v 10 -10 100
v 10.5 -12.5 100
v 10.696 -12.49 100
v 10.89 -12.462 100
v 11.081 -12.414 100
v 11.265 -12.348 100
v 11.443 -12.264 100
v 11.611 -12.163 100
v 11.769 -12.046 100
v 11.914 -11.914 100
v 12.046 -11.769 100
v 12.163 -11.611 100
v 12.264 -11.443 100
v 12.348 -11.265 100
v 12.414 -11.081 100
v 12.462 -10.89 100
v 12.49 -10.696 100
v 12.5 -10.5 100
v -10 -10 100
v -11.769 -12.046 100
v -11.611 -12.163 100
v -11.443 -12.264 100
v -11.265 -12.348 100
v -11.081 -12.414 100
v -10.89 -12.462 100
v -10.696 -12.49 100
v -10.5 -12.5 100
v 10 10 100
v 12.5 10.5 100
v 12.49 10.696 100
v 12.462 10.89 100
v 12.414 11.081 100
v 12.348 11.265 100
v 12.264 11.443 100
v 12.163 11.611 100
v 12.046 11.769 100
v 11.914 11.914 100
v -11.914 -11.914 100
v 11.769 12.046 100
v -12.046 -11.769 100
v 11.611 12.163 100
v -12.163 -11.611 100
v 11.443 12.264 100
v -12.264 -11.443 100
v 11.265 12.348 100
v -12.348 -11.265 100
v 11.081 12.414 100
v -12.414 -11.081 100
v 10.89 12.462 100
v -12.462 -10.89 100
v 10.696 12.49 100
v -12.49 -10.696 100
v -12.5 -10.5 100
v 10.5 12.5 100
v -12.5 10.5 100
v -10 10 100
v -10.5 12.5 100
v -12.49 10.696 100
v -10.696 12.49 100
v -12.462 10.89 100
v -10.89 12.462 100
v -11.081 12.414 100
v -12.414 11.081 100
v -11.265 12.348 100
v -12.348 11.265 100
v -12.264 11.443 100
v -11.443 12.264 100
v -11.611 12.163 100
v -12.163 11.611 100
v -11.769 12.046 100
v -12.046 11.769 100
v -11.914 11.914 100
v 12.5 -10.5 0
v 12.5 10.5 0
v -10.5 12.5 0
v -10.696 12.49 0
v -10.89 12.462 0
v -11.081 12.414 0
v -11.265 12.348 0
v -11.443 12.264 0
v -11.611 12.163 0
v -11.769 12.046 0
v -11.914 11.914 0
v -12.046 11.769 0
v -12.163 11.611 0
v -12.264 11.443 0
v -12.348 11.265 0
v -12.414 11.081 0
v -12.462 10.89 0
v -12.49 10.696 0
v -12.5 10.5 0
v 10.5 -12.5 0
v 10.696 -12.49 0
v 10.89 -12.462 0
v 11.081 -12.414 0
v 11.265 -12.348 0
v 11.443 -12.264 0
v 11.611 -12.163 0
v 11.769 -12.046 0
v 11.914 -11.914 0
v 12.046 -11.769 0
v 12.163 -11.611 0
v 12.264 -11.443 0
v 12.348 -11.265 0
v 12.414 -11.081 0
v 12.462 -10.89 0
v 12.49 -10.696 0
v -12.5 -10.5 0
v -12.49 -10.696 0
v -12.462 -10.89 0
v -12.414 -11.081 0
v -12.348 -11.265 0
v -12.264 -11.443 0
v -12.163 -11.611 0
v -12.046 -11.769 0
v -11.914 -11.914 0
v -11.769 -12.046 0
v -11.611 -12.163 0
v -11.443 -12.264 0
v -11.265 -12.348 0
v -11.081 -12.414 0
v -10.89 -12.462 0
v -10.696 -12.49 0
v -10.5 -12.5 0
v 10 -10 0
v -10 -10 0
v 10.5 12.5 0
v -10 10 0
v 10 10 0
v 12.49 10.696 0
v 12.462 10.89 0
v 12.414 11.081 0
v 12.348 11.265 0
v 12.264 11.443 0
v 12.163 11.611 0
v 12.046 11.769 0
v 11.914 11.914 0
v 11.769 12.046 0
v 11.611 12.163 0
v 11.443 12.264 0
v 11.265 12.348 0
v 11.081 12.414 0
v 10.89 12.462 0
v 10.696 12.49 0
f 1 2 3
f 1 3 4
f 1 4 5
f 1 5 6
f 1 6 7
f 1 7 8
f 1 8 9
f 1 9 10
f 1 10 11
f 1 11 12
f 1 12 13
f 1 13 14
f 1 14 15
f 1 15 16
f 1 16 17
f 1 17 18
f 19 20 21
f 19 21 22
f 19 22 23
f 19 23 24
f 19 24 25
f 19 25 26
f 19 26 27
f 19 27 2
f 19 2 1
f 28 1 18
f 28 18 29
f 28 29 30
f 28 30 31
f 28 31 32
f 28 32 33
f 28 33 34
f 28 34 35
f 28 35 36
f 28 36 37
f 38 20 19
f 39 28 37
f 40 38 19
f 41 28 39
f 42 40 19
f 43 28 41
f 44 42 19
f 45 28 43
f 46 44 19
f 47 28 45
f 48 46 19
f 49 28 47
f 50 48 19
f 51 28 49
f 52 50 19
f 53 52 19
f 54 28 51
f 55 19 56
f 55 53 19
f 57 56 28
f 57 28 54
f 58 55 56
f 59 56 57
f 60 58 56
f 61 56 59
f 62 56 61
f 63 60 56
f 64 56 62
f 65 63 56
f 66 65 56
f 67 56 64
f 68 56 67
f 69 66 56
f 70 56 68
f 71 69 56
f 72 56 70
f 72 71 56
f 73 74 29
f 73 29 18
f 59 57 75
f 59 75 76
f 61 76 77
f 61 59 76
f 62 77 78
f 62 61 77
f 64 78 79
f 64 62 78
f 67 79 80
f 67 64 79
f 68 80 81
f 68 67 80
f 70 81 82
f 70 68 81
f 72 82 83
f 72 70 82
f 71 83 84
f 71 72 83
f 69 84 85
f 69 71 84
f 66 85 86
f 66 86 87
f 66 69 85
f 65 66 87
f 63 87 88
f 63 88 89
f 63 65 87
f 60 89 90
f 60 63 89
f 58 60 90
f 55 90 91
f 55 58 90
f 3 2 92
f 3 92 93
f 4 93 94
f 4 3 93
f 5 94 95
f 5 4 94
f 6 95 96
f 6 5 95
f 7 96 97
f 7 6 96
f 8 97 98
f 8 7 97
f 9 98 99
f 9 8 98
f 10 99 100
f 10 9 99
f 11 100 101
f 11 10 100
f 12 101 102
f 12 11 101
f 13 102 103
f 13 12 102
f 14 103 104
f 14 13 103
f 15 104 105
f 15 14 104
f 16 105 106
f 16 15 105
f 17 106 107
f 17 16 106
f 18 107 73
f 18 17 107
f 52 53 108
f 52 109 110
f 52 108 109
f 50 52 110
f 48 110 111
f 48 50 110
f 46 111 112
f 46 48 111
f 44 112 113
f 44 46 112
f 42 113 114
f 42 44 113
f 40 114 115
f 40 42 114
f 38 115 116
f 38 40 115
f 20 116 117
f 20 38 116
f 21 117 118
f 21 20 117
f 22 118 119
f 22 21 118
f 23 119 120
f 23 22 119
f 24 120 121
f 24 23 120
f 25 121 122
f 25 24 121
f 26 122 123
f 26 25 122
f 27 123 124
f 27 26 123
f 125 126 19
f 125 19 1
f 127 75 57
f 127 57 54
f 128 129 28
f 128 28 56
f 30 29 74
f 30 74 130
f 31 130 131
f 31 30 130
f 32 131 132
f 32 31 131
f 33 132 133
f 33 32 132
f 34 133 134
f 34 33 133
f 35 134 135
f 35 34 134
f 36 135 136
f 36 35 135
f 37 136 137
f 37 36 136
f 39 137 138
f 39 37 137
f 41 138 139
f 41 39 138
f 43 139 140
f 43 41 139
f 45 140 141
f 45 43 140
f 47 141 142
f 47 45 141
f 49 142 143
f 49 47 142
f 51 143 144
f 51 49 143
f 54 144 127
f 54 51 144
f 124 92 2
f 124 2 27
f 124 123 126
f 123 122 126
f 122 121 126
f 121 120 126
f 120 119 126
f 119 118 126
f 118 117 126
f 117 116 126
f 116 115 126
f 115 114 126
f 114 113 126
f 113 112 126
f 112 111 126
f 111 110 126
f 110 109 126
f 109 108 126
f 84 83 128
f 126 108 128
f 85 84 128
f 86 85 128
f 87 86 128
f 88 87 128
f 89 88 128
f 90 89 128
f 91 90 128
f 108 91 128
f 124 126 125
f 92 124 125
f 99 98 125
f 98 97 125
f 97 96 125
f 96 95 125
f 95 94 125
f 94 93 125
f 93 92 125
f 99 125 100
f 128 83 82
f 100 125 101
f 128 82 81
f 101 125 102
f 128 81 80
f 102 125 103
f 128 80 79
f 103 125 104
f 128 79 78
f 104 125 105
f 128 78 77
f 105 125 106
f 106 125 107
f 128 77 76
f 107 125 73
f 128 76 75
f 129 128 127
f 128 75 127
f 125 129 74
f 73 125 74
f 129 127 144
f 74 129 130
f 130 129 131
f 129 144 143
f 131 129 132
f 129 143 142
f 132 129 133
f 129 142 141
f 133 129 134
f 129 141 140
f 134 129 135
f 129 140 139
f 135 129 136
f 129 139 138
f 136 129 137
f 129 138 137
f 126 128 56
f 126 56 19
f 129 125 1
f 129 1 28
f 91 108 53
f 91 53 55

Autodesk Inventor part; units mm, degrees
ref_plane "YZ Plane" through (0, 0, 0) normal (1, 0, 0) x (0, 1, 0)
sketch "Sketch1" plane through (0, 0, 0) normal (0, 0, 1) x (1, 0, 0)
  line L0 (-12.5, 12.5) -> (12.5, 12.5)
  line L1 (12.5, 12.5) -> (12.5, -12.5)
  line L2 (12.5, -12.5) -> (-12.5, -12.5)
  line L3 (-12.5, -12.5) -> (-12.5, 12.5)
  line L4 (10, 10) -> (-10, 10)
  line L5 (-10, 10) -> (-10, -10)
  line L6 (-10, -10) -> (10, -10)
  line L7 (10, -10) -> (10, 10)
  point P0 (0, 0)
  dimension "d0" = 25
  dimension "d1" = 25
  dimension "d2" = 12.5
  dimension "d3" = 12.5
  dimension "d4" = 2.5
extrude "Extrusion1" add sketch "Sketch1" along normal blind 1000
fillet "Fillet1" radius 2 4 edges at (12.5, 12.5, 500) (-12.5, 12.5, 500) (-12.5, -12.5, 500) (12.5, -12.5, 500)
ref_plane "Work Plane1" through (0, 0, 100) normal (0, 0, -1) x (-1, 0, 0)
split "Split1" plane through (0, 0, 100) removes the side toward (0, 0, 1)
ref_plane "axialPlane" through (0, -10.5, 0) normal (1, 0, 0) x (0, 0, -1)
equation "\"d0\" = -2 * a + sm_varx_squareBarDimension - tol"
equation "\"d1\" = d0"
equation "\"d2\" = 0.5 * d1"
equation "\"d3\" = 0.5 * d0"
equation "\"d4\" = sm_varx_squareBarThickness"
equation "\"sm_varx_squareBarThickness\" = 2.5"
equation "\"a\" = sm_varx_squareBarThickness"
equation "\"hoop_angle_z\" = 45deg"
equation "\"hoop_bearing_length\" = 5deg"
equation "\"hoop_cable_diam\" = 5"
equation "\"hoop_cable_pulley_diam\" = 22"
equation "\"hoop_thickness_large\" = 4"
equation "\"hoop_thickness_medium\" = 3.2"
equation "\"hoop_thickness_small\" = 2"
equation "\"hoop_width_large\" = 51"
equation "\"hoop_width_medium\" = 33.7"
equation "\"hoop_width_small\" = 25.4"
equation "\"rack_tooth_addendum\" = 5"
equation "\"rack_tooth_dedendum\" = 5"
equation "\"rack_tooth_thickness\" = 5"
equation "\"secure_arm_angle\" = 35deg"
equation "\"secure_arm_radii\" = 9"
equation "\"support_baseClamp_platformLengthBuffer\" = 35"
equation "\"support_baseClamp_platformThickness\" = 15"
equation "\"support_baseClamp_platformWidthBuffer\" = 0"
equation "\"support_baseClamp_sleeveHoleDiameter\" = 12"
equation "\"support_baseClamp_sleeveSweepTerminationAngle\" = 55deg"
equation "\"support_baseClamp_thickness\" = 8"
equation "\"support_frame_endHoleBuffer\" = 45"
equation "\"support_frame_squareBarFillet\" = 2"
equation "\"support_frame_squareBarThickness\" = 5"
equation "\"hoop_tabs_thickness\" = 6"
equation "\"hoop_tabs_hole\" = 12"
equation "\"wheelchair_deployed_width\" = 635"
equation "\"wheelchair_deployed_length\" = 1067"
equation "\"wheelchair_deployed_height\" = 914"
equation "\"sm_varx_pinPlate_thickness\" = 5"
equation "\"sm_varx_pinPlate_holeDiameter\" = 5"
equation "\"sm_varx_member_tolerance\" = 0"
equation "\"hoop_bushing12_radialInterference\" = 0"
equation "\"hoop_bushing23_radialInterference\" = 0"
equation "\"hoop_bushing23_od\" = -2 * hoop_thickness_medium + hoop_width_medium + hoop_bushing23_radialInterference"
equation "\"hoop_bushing23_thickness\" = -hoop_width_small + hoop_bushing23_od - 2 * hoop_bushing23_radialInterference"
equation "\"hoop_bushing12_od\" = -2 * hoop_thickness_large + hoop_width_large + hoop_bushing12_radialInterference"
equation "\"wheelchatir_pos_deploy_angle_0\" = 65deg"
equation "\"wheelchatir_pos_store_angle_0\" = 90deg"
equation "\"wheelchatir_pos_deploy_angle_1\" = 20deg"
equation "\"wheelchatir_pos_store_angle_1\" = 20deg"
equation "\"hoop_bushing12_thickness\" = -hoop_width_medium + hoop_bushing12_od - 2 * hoop_bushing12_radialInterference"
equation "\"sm_varx_squareBarDimension\" = 30"
equation "\"tol\" = 0"
properties part number "member_axial" material "Steel, Galvanized"
